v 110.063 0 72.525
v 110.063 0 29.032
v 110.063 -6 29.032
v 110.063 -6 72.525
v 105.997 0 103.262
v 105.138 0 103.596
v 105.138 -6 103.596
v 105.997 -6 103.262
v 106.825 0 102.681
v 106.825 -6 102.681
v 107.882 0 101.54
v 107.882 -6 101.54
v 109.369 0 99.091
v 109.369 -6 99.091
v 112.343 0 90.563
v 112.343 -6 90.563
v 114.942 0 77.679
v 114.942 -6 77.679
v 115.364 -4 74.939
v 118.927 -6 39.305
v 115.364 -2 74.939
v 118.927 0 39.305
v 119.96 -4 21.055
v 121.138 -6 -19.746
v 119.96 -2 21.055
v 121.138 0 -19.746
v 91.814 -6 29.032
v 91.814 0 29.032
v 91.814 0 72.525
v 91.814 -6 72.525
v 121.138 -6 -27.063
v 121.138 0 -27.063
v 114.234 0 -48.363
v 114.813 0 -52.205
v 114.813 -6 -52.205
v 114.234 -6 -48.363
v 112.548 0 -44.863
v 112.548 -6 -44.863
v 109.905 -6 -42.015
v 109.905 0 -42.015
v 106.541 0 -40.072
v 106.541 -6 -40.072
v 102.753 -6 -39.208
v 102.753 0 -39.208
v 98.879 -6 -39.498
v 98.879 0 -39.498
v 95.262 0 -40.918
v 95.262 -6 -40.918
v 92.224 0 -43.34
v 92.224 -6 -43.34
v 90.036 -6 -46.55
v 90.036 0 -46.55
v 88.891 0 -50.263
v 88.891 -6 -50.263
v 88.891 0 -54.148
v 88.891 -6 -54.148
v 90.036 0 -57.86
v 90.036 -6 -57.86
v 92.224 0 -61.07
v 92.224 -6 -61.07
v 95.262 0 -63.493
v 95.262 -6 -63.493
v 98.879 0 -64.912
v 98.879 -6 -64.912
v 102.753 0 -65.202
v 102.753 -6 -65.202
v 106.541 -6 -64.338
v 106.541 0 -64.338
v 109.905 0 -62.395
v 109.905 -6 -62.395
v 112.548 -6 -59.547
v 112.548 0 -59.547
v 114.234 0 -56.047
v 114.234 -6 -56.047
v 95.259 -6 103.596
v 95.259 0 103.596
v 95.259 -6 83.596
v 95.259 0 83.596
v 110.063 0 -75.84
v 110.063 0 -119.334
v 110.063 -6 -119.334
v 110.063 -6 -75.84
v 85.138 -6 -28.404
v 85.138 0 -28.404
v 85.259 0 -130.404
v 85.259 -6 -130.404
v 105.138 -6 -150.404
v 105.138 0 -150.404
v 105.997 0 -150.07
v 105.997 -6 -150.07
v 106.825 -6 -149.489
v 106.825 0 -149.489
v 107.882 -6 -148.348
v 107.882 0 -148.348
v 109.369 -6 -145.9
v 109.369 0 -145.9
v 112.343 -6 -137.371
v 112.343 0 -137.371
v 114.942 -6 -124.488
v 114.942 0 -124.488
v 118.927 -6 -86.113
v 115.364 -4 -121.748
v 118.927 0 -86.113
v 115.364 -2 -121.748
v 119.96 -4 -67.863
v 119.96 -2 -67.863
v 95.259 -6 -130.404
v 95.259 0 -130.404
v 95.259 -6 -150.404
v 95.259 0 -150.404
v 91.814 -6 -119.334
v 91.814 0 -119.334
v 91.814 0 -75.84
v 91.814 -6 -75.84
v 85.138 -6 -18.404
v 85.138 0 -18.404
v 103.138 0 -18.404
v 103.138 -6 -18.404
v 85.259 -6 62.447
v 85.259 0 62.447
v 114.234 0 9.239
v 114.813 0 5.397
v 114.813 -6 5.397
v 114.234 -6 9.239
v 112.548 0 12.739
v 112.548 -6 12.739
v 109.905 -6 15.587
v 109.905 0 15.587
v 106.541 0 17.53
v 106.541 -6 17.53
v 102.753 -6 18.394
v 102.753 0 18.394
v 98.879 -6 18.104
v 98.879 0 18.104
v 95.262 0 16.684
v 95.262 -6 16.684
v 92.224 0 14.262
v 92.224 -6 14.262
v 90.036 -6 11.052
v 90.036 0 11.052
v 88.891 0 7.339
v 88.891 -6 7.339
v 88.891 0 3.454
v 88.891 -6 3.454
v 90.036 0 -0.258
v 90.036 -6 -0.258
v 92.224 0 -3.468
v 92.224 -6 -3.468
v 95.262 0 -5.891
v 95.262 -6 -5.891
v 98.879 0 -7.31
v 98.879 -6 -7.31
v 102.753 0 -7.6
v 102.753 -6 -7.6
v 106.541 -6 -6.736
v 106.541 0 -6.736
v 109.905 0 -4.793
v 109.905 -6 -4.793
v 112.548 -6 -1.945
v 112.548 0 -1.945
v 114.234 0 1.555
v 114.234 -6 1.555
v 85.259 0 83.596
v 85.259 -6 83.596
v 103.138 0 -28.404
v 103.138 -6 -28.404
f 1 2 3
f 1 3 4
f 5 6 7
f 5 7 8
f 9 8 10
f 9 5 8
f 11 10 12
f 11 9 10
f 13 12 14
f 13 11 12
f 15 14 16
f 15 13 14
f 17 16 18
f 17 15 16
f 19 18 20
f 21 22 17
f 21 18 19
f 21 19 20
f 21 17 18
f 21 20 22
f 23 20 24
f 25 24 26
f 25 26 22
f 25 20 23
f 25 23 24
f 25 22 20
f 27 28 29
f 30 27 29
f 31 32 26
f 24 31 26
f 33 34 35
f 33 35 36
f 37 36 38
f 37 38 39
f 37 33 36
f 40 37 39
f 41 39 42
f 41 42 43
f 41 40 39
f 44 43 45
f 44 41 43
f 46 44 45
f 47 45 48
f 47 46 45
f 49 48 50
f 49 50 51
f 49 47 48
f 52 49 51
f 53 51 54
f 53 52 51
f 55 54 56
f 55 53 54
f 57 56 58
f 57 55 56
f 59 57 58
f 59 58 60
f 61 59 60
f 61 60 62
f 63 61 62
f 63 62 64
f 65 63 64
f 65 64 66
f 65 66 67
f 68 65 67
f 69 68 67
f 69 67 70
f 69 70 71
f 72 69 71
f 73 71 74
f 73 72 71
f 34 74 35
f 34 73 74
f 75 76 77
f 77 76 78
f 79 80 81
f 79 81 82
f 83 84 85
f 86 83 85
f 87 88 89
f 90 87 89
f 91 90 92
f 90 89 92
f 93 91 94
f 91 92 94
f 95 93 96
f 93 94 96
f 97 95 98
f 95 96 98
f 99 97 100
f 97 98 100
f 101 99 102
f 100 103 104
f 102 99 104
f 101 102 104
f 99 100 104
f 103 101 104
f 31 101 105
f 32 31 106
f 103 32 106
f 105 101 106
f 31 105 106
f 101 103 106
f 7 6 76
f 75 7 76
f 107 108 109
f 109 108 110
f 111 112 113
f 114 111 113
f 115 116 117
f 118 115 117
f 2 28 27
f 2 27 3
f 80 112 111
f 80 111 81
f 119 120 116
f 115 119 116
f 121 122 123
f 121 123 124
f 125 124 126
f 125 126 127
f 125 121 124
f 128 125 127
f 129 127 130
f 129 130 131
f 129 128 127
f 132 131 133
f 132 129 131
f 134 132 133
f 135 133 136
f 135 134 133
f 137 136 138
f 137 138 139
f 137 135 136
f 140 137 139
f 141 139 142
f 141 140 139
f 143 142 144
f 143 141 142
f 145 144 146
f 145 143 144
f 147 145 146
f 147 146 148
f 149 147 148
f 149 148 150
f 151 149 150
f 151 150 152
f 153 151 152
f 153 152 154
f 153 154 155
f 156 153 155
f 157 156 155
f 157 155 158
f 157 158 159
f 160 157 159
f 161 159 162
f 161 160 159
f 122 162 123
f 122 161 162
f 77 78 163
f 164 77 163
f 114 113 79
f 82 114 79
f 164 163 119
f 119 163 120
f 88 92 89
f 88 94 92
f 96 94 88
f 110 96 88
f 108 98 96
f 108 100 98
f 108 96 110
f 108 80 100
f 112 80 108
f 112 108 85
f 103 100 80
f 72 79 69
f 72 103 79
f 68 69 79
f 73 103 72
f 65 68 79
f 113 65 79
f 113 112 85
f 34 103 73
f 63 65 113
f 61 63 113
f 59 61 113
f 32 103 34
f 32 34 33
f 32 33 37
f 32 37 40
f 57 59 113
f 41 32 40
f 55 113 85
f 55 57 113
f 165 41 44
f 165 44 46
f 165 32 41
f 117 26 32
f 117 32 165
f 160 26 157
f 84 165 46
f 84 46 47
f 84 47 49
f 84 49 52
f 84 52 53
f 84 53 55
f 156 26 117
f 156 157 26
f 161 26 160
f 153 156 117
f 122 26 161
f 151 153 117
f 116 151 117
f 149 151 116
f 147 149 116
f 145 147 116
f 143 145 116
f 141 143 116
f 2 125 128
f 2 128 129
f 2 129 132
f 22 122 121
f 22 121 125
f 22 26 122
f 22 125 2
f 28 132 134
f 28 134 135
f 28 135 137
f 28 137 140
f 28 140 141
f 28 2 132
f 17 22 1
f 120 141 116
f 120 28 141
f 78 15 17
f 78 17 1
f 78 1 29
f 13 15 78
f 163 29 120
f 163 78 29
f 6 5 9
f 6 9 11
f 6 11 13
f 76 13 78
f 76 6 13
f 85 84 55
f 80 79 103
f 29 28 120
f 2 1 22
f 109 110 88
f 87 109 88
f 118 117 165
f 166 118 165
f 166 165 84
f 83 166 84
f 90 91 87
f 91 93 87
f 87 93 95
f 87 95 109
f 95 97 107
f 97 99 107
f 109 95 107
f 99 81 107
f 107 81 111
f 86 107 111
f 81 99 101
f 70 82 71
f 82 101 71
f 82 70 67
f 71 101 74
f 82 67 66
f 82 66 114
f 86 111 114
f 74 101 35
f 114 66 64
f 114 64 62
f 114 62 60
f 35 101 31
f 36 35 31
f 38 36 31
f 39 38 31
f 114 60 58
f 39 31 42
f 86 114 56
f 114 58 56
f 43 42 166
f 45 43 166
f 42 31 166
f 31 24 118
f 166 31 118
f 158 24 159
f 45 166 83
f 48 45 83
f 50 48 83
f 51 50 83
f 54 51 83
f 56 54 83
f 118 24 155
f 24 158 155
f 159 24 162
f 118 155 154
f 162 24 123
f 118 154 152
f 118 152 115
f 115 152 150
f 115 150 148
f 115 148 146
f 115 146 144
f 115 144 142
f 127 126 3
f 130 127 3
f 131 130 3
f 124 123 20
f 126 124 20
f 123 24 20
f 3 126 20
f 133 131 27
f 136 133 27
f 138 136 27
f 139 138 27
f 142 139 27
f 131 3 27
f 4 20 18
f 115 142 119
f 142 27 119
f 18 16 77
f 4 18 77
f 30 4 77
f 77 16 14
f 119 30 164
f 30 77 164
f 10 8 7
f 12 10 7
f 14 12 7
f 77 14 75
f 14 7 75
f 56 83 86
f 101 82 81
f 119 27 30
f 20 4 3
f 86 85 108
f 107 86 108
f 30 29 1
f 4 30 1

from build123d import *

# Parameters (mm, degrees)
F0_R     = 13.033720186
F0_W     = 18.248938024
F0_H     = 43.4933193028
F1_DEPTH = 6


# Not quite as in the source:
# - a feature names something its author has since deleted; it is built from what else it names


with BuildPart() as f1:
    # F0 (on Front) → F1 (new body)
    with BuildSketch(Plane.XZ):
        with BuildLine():
            add(Edge.make_bspline(
                [(105.1375677345, 103.5958733921), (118.915635106, 100.3235823913), (120.9318600426, 1.7429371205), (121.1375677345, -19.7457277863)],
                knots=[0, 0, 0, 0, 110.2279027072, 110.2279027072, 110.2279027072, 110.2279027072], degree=3))
            Line((105.1375677345, 103.5958733921), (95.2585982296, 103.5958733921))
            Line((95.2585982296, 103.5958733921), (95.2585982296, 83.5958733921))
            Line((95.2585982296, 83.5958733921), (85.2585982296, 83.5958733921))
            Line((85.2585982296, 83.5958733921), (85.2585982296, 62.4470586631))
            Line((85.2585982296, 62.4470586631), (85.1375677345, -18.4041266079))
            Line((85.1375677345, -18.4041266079), (103.1375677345, -18.4041266079))
            Line((103.1375677345, -18.4041266079), (103.1375677345, -23.4041266079))
            Line((103.1375677345, -23.4041266079), (121.1375677345, -23.4041266079))
            Line((121.1375677345, -23.4041266079), (121.1375677345, -19.7457277863))
        make_face()
        with Locations((101.7788599941, 5.3969110339)):
            Circle(F0_R, mode=Mode.SUBTRACT)
        with Locations((100.9382642806, 50.7787894458)):
            Rectangle(F0_W, F0_H, mode=Mode.SUBTRACT)
        with BuildLine():
            Line((121.1375677345, -27.0625254295), (121.1375677345, -23.4041266079))
            Line((121.1375677345, -23.4041266079), (103.1375677345, -23.4041266079))
            Line((103.1375677345, -23.4041266079), (103.1375677345, -28.4041266079))
            Line((103.1375677345, -28.4041266079), (85.1375677345, -28.4041266079))
            Line((85.1375677345, -28.4041266079), (85.2585982296, -130.4041266079))
            Line((85.2585982296, -130.4041266079), (95.2585982296, -130.4041266079))
            Line((95.2585982296, -130.4041266079), (95.2585982296, -150.4041266079))
            Line((95.2585982296, -150.4041266079), (105.1375677345, -150.4041266079))
            add(Edge.make_bspline(
                [(105.1375677345, -150.4041266079), (118.915635106, -147.1318356072), (120.9318600426, -48.5511903363), (121.1375677345, -27.0625254295)],
                knots=[0, 0, 0, 0, 110.2279027072, 110.2279027072, 110.2279027072, 110.2279027072], degree=3))
        make_face()
        with Locations((100.9382642806, -97.5870426616)):
            Rectangle(F0_W, F0_H, mode=Mode.SUBTRACT)
        with Locations((101.7788599941, -52.2051642497)):
            Circle(F0_R, mode=Mode.SUBTRACT)
    extrude(amount=F1_DEPTH)


solid = f1.part
